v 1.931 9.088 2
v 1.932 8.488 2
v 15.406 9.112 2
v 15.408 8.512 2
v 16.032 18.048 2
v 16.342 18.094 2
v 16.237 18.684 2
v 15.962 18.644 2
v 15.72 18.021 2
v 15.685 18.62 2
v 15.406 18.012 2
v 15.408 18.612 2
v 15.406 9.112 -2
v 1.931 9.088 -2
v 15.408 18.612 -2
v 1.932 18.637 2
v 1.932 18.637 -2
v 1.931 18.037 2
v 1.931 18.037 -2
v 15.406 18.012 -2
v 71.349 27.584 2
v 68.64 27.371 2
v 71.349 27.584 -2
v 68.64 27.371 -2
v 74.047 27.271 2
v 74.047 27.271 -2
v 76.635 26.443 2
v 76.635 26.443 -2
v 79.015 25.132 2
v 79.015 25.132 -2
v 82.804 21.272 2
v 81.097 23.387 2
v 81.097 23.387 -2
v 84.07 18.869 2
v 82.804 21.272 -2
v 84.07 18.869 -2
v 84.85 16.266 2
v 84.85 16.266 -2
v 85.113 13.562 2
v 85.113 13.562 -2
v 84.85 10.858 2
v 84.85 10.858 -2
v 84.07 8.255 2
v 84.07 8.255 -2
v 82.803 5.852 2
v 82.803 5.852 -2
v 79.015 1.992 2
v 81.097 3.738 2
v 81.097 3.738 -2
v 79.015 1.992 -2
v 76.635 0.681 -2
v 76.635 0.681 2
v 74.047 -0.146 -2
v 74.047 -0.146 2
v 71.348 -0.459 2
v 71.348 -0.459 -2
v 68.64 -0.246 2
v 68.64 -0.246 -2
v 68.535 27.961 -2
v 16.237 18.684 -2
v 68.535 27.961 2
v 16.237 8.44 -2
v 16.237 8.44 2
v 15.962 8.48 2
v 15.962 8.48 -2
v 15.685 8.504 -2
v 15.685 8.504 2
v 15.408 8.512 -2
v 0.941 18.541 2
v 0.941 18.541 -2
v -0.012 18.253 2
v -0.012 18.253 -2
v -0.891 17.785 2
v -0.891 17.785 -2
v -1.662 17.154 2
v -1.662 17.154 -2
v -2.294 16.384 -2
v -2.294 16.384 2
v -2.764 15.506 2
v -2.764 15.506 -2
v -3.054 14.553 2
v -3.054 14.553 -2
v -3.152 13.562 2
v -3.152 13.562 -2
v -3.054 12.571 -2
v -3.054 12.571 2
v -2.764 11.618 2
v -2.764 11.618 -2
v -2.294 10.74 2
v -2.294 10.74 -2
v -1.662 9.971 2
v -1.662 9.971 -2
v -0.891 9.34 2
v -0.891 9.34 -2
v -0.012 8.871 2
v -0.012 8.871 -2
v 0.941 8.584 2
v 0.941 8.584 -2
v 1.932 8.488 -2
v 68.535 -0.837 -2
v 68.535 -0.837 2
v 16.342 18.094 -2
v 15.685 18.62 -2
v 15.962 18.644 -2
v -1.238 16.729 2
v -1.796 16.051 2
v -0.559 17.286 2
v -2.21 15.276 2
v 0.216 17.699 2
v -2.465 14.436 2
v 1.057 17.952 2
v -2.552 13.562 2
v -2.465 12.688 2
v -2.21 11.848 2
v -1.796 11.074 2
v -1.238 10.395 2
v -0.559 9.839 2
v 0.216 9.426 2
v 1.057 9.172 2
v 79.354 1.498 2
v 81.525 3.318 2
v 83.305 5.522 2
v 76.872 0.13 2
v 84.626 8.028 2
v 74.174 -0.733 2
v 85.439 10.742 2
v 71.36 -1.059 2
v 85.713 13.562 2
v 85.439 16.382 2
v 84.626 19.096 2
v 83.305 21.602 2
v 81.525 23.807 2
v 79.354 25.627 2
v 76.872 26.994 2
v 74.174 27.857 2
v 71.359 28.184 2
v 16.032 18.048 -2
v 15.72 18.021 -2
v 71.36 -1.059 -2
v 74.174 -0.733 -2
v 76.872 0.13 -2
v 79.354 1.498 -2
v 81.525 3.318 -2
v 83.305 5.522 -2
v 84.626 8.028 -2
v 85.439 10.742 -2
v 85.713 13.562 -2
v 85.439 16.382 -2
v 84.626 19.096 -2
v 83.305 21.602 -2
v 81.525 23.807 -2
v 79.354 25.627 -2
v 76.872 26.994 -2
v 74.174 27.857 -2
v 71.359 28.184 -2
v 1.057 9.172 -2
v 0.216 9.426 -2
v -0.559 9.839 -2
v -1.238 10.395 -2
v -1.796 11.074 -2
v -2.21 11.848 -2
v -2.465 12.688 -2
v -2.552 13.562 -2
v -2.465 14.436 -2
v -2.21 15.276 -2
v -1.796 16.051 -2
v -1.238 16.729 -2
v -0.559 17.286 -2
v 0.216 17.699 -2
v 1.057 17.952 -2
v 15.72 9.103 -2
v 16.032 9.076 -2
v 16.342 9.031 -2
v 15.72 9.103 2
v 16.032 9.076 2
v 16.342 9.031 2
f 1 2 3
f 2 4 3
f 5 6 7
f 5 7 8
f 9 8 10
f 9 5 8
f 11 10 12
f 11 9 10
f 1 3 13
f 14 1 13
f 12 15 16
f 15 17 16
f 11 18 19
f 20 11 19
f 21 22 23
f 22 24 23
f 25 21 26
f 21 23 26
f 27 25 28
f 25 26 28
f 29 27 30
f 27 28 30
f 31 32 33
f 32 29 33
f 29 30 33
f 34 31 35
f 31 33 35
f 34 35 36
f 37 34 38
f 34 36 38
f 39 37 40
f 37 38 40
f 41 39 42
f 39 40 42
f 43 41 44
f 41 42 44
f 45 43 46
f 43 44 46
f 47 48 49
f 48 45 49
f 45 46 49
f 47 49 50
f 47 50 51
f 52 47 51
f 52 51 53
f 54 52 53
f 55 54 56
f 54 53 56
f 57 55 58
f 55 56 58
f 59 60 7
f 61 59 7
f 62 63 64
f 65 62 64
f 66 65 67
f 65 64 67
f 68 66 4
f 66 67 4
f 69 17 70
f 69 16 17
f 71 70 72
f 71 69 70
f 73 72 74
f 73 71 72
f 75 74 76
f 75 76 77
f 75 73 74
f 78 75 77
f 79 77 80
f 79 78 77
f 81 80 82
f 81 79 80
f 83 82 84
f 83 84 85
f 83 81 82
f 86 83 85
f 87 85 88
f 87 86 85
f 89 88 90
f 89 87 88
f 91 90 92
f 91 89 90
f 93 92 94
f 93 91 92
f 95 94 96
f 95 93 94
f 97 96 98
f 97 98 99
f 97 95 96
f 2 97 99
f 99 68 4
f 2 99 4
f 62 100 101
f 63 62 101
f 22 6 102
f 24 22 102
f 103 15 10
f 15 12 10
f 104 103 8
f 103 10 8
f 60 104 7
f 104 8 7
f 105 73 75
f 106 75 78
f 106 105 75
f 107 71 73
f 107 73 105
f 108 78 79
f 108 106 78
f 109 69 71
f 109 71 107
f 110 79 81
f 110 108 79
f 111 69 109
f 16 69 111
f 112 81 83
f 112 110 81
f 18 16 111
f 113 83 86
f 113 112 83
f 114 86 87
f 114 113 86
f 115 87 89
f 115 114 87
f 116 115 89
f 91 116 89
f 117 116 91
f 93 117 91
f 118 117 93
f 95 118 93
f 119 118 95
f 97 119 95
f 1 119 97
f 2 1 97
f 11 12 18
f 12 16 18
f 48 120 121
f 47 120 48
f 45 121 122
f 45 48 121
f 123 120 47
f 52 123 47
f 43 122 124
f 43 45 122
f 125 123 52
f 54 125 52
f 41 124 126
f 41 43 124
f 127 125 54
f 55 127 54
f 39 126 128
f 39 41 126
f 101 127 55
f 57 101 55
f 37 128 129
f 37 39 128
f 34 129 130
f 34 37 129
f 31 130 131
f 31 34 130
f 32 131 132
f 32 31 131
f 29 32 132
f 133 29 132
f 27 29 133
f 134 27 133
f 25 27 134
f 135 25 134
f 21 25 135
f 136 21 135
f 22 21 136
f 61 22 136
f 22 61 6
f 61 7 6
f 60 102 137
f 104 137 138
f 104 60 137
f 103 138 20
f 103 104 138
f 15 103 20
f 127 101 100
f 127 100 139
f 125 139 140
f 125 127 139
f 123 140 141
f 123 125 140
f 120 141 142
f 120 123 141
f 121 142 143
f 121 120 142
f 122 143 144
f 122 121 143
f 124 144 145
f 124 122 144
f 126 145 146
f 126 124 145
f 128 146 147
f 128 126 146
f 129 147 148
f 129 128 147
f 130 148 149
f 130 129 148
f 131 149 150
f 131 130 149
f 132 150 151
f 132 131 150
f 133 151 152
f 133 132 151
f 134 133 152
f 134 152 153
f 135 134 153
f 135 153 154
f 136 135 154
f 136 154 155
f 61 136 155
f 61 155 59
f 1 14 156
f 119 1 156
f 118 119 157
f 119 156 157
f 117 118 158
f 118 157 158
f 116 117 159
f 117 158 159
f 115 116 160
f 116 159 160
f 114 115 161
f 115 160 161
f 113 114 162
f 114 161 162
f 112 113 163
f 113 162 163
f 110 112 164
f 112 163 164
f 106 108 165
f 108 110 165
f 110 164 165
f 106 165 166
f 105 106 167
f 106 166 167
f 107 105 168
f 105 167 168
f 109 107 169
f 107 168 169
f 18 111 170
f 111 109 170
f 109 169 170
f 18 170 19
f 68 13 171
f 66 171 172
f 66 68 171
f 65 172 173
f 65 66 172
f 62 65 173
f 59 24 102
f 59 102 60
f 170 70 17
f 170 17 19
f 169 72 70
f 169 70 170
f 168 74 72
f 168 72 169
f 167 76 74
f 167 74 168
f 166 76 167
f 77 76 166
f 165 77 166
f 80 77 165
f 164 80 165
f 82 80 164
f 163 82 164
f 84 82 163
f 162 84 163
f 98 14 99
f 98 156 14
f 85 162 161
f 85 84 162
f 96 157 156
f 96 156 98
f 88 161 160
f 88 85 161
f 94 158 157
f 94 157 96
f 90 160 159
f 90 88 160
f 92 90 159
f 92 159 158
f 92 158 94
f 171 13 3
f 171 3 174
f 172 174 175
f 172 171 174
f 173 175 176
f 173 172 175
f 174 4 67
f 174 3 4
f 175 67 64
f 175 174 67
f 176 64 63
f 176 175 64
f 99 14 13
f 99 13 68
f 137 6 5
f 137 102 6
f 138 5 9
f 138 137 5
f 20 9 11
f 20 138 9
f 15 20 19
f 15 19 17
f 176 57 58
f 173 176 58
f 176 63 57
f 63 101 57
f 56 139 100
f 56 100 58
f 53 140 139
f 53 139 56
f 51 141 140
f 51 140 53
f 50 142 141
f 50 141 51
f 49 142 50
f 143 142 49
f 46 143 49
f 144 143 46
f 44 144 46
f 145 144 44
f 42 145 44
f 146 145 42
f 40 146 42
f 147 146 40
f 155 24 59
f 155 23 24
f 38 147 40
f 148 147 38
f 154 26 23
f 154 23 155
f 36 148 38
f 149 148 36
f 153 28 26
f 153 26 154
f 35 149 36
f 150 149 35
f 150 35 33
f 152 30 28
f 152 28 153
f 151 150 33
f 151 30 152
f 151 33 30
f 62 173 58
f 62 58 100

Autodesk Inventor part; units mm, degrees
sketch "Sketch Path" plane through (0, 0, 0) normal (0, 0, 1) x (1, 0, 0)
  arc A0 (1.9319, 18.3368) -> (1.9319, 8.7876) centre (1.9231, 13.5622) ccw
  arc A1 (16.2894, 8.7353) -> (15.407, 8.8122) centre (15.4161, 3.8122) ccw
  arc A2 (68.5875, -0.5416) -> (68.5875, 27.666) centre (71.0893, 13.5622) ccw
  arc A3 (15.407, 18.3122) -> (16.2894, 18.3891) centre (15.4161, 23.3122) ccw
  line L0 (15.407, 18.3122) -> (1.9319, 18.3368)
  line L1 (1.9319, 8.7876) -> (15.407, 8.8122)
  line L2 (16.2894, 8.7353) -> (68.5875, -0.5416)
  line L3 (68.5875, 27.666) -> (16.2894, 18.3891)
ref_plane "Cross Section Plane" through (1.9319, 18.3368, 0) normal (1, -0.0018, 0) x (0, 0, 1)
ref_plane "Work Plane2" through (1.9231, 13.5622, 0) normal (-1, 0, 0) x (0, 0, 1)
ref_plane "Work Plane3" through (71.0893, 13.5622, 0) normal (0.9951, -0.0987, 0) x (0, 0, 1)
sketch "Cross Section" plane through (1.9319, 18.3368, 0) normal (1, -0.0018, 0) x (0, 0, 1)
  line L0 (-2, 0.3) -> (2, 0.3)
  line L1 (2, 0.3) -> (2, -0.3)
  line L2 (2, -0.3) -> (-2, -0.3)
  line L3 (-2, -0.3) -> (-2, 0.3)
  line L4 (-2, 0) -> (2, 0) construction
  point P0 (0, 0)
  point P1 (0, 0)
  dimension "d0" = 4
  dimension "d4" = 0.3
  dimension "d5" = 0.3
sweep "Belt" add profiles "Cross Section" path "Sketch Path"
equation "\"d0\" = da_B"
equation "\"d4\" = da_a"
equation "\"d5\" = da_a2"
equation "\"da_B\" = 4"
equation "\"da_pb\" = 2.5"
equation "\"da_a\" = 0.3"
equation "\"da_S\" = 1.5"
equation "\"da_Beta\" = 20deg"
equation "\"da_Ht\" = 0.7"
equation "\"da_H\" = 1.3"
equation "\"da_a2\" = 0.3"
properties part number "Synchronous Belt" material "Rubber"
